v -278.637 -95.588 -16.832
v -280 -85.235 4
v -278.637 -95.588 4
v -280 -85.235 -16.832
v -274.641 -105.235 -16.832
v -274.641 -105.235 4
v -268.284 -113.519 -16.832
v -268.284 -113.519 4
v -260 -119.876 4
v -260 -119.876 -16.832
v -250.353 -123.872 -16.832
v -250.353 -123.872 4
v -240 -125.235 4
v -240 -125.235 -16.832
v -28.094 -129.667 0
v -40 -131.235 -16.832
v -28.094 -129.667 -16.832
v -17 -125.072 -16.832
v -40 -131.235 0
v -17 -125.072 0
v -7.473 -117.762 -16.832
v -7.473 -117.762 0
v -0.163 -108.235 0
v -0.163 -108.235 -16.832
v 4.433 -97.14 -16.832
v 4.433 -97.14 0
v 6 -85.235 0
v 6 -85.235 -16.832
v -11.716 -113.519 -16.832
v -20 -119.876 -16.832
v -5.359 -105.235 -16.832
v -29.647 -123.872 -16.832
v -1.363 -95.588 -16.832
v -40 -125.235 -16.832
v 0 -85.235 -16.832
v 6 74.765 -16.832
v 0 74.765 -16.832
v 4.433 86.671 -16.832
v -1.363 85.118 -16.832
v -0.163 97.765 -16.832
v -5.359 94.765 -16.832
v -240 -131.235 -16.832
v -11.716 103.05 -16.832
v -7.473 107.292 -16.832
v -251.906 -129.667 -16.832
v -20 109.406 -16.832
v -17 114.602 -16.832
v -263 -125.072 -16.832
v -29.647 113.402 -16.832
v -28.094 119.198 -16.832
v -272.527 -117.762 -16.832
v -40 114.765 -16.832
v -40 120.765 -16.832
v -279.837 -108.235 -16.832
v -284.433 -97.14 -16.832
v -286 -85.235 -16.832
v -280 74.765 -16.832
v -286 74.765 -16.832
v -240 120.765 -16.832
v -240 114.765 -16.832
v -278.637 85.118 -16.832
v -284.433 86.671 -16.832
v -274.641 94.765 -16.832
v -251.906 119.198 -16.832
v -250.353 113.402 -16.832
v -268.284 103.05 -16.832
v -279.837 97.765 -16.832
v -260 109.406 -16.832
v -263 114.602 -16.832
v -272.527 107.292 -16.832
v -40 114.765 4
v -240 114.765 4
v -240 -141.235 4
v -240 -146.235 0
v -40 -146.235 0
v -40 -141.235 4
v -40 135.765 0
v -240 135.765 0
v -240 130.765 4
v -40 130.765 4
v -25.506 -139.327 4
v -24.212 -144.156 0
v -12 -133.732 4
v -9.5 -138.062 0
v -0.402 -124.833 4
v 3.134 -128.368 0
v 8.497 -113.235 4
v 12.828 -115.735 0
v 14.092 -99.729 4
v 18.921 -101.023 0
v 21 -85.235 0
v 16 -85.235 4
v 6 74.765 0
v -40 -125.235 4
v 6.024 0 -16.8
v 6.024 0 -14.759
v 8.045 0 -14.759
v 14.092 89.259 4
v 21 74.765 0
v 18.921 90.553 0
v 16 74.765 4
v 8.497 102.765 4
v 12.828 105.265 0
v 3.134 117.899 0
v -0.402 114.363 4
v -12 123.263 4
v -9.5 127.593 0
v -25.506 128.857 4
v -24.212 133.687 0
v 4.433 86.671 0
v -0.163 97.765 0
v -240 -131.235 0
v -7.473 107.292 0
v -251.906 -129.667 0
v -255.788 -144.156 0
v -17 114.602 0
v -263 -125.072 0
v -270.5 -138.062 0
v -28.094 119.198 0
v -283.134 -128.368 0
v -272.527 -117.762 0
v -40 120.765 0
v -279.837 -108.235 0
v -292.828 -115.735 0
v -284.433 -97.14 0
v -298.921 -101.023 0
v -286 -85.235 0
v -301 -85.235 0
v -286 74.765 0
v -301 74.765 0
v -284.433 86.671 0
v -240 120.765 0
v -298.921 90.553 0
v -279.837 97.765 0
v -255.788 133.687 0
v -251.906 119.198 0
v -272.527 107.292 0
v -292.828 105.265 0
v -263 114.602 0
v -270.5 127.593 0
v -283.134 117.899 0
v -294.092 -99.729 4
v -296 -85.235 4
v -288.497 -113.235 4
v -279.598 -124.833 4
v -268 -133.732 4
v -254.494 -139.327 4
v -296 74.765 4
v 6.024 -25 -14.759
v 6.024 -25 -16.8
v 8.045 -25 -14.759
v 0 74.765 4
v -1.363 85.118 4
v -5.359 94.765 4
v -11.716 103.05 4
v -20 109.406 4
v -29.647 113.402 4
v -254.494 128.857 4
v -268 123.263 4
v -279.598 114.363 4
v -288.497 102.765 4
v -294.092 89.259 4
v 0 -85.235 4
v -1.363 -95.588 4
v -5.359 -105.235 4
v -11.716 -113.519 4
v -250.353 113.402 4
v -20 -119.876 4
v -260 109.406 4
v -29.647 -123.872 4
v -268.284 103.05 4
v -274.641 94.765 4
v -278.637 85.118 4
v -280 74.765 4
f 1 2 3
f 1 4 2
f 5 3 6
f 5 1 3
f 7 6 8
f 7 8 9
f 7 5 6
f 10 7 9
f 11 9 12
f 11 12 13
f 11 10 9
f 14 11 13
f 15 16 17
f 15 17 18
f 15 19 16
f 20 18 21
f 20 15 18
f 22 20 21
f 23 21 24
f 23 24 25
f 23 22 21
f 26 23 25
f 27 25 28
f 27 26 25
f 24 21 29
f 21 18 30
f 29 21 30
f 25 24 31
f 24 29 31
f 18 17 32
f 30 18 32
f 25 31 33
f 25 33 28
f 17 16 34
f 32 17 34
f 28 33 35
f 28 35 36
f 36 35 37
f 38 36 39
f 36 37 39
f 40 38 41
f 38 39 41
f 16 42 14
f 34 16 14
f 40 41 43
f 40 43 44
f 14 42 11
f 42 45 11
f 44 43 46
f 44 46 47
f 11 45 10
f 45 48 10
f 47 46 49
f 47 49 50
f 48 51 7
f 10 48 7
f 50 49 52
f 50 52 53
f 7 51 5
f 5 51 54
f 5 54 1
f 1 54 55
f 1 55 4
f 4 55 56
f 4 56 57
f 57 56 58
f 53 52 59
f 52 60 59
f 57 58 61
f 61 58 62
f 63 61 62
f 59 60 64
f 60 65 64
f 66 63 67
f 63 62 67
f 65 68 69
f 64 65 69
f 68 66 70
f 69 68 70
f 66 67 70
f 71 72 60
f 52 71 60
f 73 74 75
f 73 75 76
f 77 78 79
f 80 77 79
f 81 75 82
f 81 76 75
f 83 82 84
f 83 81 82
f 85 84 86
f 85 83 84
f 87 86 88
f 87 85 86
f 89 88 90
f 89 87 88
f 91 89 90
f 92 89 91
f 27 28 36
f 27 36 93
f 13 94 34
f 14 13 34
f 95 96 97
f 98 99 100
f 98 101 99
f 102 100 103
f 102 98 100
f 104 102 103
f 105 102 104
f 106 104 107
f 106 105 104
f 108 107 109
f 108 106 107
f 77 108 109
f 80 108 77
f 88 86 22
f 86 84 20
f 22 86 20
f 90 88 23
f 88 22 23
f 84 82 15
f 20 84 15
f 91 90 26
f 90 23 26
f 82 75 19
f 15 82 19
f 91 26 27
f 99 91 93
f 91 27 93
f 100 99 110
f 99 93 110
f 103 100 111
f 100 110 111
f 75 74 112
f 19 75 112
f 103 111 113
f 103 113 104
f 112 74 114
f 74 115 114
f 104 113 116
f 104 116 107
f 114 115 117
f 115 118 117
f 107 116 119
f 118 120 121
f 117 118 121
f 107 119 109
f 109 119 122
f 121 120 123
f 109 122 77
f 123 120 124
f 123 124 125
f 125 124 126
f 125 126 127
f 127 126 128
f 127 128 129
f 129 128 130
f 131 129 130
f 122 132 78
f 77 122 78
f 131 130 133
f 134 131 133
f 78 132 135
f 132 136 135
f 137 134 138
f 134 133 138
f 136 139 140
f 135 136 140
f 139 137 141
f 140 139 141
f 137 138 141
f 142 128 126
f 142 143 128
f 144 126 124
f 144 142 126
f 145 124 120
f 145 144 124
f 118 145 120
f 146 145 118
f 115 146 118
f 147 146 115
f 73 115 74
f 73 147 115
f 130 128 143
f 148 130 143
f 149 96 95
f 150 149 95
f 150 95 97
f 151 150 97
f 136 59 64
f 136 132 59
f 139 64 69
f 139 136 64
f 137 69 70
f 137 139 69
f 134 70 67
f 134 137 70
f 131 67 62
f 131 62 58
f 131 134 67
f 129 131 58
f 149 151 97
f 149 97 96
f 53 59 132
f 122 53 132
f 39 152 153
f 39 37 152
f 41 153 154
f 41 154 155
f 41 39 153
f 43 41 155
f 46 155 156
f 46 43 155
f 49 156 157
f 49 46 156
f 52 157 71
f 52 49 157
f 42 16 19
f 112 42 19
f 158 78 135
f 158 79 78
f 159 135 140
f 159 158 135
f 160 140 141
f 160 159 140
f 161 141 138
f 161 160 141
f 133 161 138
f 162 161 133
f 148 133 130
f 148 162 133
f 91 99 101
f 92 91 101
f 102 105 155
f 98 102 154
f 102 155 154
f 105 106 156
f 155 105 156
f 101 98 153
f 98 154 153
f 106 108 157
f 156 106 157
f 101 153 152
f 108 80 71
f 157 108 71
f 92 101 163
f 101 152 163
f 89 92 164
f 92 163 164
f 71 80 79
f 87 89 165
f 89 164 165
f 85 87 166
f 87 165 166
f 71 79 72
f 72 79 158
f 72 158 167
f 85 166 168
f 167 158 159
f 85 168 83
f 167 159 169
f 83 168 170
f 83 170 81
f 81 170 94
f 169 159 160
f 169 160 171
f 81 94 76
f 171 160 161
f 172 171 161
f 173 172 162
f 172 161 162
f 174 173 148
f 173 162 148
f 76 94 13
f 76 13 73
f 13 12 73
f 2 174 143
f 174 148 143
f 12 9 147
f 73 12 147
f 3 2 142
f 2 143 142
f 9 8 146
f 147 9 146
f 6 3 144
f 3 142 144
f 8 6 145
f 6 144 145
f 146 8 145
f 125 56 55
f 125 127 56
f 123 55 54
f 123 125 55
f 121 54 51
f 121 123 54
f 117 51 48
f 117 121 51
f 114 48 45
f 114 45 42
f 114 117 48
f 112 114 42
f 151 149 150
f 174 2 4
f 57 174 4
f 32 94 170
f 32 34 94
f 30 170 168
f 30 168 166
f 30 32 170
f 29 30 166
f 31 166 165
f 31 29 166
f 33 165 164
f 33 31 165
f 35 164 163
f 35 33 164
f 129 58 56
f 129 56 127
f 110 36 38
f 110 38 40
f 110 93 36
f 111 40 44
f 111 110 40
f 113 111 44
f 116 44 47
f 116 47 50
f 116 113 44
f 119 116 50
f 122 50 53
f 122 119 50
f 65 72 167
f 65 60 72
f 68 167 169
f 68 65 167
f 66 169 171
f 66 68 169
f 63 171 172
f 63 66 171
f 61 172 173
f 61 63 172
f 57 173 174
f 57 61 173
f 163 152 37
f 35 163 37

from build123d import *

# Parameters (mm, degrees)
F0_W     = 6
F0_H     = 16.8318616902
F4_DEPTH = 25


with BuildPart() as f2:
    # F2: sweep along a path in F1
    with BuildLine(Plane.XY) as f2_path:
        Line((-40, 114.765252769), (-240, 114.765252769))
        ThreePointArc((-240, 114.765252769), (-268.2842712475, 103.0495240165), (-280, 74.765252769))
        Line((-280, 74.765252769), (-280, -85.234747231))
        ThreePointArc((-280, -85.234747231), (-268.2842712475, -113.5190184785), (-240, -125.234747231))
        Line((-240, -125.234747231), (-40, -125.234747231))
        ThreePointArc((-40, -125.234747231), (-11.7157287525, -113.5190184785), (0, -85.234747231))
        Line((0, -85.234747231), (0, 74.765252769))
        ThreePointArc((0, 74.765252769), (-11.7157287525, 103.0495240165), (-40, 114.765252769))
    # F0 (on Front) → F2 (sweep)
    with BuildSketch(Plane.XZ):
        Polygon((0, 4), (0, 0), (6, 0), (16, 0), (16, 4), align=None)
        with Locations((3, -8.4159308451)):
            Rectangle(F0_W, F0_H)
        Polygon((16, 4), (16, 0), (21, 0), align=None)
    sweep(path=f2_path.line)


with BuildPart() as f4:
    # F3 (on Front) → F4 (new body)
    with BuildSketch(Plane.XZ):
        Polygon((8.0447122901, -14.7590936869), (6.0244281776, -14.7590936869), (6.0244281776, -16.8002173305), align=None)
    extrude(amount=F4_DEPTH)


solid = Compound([f2.part, f4.part])
